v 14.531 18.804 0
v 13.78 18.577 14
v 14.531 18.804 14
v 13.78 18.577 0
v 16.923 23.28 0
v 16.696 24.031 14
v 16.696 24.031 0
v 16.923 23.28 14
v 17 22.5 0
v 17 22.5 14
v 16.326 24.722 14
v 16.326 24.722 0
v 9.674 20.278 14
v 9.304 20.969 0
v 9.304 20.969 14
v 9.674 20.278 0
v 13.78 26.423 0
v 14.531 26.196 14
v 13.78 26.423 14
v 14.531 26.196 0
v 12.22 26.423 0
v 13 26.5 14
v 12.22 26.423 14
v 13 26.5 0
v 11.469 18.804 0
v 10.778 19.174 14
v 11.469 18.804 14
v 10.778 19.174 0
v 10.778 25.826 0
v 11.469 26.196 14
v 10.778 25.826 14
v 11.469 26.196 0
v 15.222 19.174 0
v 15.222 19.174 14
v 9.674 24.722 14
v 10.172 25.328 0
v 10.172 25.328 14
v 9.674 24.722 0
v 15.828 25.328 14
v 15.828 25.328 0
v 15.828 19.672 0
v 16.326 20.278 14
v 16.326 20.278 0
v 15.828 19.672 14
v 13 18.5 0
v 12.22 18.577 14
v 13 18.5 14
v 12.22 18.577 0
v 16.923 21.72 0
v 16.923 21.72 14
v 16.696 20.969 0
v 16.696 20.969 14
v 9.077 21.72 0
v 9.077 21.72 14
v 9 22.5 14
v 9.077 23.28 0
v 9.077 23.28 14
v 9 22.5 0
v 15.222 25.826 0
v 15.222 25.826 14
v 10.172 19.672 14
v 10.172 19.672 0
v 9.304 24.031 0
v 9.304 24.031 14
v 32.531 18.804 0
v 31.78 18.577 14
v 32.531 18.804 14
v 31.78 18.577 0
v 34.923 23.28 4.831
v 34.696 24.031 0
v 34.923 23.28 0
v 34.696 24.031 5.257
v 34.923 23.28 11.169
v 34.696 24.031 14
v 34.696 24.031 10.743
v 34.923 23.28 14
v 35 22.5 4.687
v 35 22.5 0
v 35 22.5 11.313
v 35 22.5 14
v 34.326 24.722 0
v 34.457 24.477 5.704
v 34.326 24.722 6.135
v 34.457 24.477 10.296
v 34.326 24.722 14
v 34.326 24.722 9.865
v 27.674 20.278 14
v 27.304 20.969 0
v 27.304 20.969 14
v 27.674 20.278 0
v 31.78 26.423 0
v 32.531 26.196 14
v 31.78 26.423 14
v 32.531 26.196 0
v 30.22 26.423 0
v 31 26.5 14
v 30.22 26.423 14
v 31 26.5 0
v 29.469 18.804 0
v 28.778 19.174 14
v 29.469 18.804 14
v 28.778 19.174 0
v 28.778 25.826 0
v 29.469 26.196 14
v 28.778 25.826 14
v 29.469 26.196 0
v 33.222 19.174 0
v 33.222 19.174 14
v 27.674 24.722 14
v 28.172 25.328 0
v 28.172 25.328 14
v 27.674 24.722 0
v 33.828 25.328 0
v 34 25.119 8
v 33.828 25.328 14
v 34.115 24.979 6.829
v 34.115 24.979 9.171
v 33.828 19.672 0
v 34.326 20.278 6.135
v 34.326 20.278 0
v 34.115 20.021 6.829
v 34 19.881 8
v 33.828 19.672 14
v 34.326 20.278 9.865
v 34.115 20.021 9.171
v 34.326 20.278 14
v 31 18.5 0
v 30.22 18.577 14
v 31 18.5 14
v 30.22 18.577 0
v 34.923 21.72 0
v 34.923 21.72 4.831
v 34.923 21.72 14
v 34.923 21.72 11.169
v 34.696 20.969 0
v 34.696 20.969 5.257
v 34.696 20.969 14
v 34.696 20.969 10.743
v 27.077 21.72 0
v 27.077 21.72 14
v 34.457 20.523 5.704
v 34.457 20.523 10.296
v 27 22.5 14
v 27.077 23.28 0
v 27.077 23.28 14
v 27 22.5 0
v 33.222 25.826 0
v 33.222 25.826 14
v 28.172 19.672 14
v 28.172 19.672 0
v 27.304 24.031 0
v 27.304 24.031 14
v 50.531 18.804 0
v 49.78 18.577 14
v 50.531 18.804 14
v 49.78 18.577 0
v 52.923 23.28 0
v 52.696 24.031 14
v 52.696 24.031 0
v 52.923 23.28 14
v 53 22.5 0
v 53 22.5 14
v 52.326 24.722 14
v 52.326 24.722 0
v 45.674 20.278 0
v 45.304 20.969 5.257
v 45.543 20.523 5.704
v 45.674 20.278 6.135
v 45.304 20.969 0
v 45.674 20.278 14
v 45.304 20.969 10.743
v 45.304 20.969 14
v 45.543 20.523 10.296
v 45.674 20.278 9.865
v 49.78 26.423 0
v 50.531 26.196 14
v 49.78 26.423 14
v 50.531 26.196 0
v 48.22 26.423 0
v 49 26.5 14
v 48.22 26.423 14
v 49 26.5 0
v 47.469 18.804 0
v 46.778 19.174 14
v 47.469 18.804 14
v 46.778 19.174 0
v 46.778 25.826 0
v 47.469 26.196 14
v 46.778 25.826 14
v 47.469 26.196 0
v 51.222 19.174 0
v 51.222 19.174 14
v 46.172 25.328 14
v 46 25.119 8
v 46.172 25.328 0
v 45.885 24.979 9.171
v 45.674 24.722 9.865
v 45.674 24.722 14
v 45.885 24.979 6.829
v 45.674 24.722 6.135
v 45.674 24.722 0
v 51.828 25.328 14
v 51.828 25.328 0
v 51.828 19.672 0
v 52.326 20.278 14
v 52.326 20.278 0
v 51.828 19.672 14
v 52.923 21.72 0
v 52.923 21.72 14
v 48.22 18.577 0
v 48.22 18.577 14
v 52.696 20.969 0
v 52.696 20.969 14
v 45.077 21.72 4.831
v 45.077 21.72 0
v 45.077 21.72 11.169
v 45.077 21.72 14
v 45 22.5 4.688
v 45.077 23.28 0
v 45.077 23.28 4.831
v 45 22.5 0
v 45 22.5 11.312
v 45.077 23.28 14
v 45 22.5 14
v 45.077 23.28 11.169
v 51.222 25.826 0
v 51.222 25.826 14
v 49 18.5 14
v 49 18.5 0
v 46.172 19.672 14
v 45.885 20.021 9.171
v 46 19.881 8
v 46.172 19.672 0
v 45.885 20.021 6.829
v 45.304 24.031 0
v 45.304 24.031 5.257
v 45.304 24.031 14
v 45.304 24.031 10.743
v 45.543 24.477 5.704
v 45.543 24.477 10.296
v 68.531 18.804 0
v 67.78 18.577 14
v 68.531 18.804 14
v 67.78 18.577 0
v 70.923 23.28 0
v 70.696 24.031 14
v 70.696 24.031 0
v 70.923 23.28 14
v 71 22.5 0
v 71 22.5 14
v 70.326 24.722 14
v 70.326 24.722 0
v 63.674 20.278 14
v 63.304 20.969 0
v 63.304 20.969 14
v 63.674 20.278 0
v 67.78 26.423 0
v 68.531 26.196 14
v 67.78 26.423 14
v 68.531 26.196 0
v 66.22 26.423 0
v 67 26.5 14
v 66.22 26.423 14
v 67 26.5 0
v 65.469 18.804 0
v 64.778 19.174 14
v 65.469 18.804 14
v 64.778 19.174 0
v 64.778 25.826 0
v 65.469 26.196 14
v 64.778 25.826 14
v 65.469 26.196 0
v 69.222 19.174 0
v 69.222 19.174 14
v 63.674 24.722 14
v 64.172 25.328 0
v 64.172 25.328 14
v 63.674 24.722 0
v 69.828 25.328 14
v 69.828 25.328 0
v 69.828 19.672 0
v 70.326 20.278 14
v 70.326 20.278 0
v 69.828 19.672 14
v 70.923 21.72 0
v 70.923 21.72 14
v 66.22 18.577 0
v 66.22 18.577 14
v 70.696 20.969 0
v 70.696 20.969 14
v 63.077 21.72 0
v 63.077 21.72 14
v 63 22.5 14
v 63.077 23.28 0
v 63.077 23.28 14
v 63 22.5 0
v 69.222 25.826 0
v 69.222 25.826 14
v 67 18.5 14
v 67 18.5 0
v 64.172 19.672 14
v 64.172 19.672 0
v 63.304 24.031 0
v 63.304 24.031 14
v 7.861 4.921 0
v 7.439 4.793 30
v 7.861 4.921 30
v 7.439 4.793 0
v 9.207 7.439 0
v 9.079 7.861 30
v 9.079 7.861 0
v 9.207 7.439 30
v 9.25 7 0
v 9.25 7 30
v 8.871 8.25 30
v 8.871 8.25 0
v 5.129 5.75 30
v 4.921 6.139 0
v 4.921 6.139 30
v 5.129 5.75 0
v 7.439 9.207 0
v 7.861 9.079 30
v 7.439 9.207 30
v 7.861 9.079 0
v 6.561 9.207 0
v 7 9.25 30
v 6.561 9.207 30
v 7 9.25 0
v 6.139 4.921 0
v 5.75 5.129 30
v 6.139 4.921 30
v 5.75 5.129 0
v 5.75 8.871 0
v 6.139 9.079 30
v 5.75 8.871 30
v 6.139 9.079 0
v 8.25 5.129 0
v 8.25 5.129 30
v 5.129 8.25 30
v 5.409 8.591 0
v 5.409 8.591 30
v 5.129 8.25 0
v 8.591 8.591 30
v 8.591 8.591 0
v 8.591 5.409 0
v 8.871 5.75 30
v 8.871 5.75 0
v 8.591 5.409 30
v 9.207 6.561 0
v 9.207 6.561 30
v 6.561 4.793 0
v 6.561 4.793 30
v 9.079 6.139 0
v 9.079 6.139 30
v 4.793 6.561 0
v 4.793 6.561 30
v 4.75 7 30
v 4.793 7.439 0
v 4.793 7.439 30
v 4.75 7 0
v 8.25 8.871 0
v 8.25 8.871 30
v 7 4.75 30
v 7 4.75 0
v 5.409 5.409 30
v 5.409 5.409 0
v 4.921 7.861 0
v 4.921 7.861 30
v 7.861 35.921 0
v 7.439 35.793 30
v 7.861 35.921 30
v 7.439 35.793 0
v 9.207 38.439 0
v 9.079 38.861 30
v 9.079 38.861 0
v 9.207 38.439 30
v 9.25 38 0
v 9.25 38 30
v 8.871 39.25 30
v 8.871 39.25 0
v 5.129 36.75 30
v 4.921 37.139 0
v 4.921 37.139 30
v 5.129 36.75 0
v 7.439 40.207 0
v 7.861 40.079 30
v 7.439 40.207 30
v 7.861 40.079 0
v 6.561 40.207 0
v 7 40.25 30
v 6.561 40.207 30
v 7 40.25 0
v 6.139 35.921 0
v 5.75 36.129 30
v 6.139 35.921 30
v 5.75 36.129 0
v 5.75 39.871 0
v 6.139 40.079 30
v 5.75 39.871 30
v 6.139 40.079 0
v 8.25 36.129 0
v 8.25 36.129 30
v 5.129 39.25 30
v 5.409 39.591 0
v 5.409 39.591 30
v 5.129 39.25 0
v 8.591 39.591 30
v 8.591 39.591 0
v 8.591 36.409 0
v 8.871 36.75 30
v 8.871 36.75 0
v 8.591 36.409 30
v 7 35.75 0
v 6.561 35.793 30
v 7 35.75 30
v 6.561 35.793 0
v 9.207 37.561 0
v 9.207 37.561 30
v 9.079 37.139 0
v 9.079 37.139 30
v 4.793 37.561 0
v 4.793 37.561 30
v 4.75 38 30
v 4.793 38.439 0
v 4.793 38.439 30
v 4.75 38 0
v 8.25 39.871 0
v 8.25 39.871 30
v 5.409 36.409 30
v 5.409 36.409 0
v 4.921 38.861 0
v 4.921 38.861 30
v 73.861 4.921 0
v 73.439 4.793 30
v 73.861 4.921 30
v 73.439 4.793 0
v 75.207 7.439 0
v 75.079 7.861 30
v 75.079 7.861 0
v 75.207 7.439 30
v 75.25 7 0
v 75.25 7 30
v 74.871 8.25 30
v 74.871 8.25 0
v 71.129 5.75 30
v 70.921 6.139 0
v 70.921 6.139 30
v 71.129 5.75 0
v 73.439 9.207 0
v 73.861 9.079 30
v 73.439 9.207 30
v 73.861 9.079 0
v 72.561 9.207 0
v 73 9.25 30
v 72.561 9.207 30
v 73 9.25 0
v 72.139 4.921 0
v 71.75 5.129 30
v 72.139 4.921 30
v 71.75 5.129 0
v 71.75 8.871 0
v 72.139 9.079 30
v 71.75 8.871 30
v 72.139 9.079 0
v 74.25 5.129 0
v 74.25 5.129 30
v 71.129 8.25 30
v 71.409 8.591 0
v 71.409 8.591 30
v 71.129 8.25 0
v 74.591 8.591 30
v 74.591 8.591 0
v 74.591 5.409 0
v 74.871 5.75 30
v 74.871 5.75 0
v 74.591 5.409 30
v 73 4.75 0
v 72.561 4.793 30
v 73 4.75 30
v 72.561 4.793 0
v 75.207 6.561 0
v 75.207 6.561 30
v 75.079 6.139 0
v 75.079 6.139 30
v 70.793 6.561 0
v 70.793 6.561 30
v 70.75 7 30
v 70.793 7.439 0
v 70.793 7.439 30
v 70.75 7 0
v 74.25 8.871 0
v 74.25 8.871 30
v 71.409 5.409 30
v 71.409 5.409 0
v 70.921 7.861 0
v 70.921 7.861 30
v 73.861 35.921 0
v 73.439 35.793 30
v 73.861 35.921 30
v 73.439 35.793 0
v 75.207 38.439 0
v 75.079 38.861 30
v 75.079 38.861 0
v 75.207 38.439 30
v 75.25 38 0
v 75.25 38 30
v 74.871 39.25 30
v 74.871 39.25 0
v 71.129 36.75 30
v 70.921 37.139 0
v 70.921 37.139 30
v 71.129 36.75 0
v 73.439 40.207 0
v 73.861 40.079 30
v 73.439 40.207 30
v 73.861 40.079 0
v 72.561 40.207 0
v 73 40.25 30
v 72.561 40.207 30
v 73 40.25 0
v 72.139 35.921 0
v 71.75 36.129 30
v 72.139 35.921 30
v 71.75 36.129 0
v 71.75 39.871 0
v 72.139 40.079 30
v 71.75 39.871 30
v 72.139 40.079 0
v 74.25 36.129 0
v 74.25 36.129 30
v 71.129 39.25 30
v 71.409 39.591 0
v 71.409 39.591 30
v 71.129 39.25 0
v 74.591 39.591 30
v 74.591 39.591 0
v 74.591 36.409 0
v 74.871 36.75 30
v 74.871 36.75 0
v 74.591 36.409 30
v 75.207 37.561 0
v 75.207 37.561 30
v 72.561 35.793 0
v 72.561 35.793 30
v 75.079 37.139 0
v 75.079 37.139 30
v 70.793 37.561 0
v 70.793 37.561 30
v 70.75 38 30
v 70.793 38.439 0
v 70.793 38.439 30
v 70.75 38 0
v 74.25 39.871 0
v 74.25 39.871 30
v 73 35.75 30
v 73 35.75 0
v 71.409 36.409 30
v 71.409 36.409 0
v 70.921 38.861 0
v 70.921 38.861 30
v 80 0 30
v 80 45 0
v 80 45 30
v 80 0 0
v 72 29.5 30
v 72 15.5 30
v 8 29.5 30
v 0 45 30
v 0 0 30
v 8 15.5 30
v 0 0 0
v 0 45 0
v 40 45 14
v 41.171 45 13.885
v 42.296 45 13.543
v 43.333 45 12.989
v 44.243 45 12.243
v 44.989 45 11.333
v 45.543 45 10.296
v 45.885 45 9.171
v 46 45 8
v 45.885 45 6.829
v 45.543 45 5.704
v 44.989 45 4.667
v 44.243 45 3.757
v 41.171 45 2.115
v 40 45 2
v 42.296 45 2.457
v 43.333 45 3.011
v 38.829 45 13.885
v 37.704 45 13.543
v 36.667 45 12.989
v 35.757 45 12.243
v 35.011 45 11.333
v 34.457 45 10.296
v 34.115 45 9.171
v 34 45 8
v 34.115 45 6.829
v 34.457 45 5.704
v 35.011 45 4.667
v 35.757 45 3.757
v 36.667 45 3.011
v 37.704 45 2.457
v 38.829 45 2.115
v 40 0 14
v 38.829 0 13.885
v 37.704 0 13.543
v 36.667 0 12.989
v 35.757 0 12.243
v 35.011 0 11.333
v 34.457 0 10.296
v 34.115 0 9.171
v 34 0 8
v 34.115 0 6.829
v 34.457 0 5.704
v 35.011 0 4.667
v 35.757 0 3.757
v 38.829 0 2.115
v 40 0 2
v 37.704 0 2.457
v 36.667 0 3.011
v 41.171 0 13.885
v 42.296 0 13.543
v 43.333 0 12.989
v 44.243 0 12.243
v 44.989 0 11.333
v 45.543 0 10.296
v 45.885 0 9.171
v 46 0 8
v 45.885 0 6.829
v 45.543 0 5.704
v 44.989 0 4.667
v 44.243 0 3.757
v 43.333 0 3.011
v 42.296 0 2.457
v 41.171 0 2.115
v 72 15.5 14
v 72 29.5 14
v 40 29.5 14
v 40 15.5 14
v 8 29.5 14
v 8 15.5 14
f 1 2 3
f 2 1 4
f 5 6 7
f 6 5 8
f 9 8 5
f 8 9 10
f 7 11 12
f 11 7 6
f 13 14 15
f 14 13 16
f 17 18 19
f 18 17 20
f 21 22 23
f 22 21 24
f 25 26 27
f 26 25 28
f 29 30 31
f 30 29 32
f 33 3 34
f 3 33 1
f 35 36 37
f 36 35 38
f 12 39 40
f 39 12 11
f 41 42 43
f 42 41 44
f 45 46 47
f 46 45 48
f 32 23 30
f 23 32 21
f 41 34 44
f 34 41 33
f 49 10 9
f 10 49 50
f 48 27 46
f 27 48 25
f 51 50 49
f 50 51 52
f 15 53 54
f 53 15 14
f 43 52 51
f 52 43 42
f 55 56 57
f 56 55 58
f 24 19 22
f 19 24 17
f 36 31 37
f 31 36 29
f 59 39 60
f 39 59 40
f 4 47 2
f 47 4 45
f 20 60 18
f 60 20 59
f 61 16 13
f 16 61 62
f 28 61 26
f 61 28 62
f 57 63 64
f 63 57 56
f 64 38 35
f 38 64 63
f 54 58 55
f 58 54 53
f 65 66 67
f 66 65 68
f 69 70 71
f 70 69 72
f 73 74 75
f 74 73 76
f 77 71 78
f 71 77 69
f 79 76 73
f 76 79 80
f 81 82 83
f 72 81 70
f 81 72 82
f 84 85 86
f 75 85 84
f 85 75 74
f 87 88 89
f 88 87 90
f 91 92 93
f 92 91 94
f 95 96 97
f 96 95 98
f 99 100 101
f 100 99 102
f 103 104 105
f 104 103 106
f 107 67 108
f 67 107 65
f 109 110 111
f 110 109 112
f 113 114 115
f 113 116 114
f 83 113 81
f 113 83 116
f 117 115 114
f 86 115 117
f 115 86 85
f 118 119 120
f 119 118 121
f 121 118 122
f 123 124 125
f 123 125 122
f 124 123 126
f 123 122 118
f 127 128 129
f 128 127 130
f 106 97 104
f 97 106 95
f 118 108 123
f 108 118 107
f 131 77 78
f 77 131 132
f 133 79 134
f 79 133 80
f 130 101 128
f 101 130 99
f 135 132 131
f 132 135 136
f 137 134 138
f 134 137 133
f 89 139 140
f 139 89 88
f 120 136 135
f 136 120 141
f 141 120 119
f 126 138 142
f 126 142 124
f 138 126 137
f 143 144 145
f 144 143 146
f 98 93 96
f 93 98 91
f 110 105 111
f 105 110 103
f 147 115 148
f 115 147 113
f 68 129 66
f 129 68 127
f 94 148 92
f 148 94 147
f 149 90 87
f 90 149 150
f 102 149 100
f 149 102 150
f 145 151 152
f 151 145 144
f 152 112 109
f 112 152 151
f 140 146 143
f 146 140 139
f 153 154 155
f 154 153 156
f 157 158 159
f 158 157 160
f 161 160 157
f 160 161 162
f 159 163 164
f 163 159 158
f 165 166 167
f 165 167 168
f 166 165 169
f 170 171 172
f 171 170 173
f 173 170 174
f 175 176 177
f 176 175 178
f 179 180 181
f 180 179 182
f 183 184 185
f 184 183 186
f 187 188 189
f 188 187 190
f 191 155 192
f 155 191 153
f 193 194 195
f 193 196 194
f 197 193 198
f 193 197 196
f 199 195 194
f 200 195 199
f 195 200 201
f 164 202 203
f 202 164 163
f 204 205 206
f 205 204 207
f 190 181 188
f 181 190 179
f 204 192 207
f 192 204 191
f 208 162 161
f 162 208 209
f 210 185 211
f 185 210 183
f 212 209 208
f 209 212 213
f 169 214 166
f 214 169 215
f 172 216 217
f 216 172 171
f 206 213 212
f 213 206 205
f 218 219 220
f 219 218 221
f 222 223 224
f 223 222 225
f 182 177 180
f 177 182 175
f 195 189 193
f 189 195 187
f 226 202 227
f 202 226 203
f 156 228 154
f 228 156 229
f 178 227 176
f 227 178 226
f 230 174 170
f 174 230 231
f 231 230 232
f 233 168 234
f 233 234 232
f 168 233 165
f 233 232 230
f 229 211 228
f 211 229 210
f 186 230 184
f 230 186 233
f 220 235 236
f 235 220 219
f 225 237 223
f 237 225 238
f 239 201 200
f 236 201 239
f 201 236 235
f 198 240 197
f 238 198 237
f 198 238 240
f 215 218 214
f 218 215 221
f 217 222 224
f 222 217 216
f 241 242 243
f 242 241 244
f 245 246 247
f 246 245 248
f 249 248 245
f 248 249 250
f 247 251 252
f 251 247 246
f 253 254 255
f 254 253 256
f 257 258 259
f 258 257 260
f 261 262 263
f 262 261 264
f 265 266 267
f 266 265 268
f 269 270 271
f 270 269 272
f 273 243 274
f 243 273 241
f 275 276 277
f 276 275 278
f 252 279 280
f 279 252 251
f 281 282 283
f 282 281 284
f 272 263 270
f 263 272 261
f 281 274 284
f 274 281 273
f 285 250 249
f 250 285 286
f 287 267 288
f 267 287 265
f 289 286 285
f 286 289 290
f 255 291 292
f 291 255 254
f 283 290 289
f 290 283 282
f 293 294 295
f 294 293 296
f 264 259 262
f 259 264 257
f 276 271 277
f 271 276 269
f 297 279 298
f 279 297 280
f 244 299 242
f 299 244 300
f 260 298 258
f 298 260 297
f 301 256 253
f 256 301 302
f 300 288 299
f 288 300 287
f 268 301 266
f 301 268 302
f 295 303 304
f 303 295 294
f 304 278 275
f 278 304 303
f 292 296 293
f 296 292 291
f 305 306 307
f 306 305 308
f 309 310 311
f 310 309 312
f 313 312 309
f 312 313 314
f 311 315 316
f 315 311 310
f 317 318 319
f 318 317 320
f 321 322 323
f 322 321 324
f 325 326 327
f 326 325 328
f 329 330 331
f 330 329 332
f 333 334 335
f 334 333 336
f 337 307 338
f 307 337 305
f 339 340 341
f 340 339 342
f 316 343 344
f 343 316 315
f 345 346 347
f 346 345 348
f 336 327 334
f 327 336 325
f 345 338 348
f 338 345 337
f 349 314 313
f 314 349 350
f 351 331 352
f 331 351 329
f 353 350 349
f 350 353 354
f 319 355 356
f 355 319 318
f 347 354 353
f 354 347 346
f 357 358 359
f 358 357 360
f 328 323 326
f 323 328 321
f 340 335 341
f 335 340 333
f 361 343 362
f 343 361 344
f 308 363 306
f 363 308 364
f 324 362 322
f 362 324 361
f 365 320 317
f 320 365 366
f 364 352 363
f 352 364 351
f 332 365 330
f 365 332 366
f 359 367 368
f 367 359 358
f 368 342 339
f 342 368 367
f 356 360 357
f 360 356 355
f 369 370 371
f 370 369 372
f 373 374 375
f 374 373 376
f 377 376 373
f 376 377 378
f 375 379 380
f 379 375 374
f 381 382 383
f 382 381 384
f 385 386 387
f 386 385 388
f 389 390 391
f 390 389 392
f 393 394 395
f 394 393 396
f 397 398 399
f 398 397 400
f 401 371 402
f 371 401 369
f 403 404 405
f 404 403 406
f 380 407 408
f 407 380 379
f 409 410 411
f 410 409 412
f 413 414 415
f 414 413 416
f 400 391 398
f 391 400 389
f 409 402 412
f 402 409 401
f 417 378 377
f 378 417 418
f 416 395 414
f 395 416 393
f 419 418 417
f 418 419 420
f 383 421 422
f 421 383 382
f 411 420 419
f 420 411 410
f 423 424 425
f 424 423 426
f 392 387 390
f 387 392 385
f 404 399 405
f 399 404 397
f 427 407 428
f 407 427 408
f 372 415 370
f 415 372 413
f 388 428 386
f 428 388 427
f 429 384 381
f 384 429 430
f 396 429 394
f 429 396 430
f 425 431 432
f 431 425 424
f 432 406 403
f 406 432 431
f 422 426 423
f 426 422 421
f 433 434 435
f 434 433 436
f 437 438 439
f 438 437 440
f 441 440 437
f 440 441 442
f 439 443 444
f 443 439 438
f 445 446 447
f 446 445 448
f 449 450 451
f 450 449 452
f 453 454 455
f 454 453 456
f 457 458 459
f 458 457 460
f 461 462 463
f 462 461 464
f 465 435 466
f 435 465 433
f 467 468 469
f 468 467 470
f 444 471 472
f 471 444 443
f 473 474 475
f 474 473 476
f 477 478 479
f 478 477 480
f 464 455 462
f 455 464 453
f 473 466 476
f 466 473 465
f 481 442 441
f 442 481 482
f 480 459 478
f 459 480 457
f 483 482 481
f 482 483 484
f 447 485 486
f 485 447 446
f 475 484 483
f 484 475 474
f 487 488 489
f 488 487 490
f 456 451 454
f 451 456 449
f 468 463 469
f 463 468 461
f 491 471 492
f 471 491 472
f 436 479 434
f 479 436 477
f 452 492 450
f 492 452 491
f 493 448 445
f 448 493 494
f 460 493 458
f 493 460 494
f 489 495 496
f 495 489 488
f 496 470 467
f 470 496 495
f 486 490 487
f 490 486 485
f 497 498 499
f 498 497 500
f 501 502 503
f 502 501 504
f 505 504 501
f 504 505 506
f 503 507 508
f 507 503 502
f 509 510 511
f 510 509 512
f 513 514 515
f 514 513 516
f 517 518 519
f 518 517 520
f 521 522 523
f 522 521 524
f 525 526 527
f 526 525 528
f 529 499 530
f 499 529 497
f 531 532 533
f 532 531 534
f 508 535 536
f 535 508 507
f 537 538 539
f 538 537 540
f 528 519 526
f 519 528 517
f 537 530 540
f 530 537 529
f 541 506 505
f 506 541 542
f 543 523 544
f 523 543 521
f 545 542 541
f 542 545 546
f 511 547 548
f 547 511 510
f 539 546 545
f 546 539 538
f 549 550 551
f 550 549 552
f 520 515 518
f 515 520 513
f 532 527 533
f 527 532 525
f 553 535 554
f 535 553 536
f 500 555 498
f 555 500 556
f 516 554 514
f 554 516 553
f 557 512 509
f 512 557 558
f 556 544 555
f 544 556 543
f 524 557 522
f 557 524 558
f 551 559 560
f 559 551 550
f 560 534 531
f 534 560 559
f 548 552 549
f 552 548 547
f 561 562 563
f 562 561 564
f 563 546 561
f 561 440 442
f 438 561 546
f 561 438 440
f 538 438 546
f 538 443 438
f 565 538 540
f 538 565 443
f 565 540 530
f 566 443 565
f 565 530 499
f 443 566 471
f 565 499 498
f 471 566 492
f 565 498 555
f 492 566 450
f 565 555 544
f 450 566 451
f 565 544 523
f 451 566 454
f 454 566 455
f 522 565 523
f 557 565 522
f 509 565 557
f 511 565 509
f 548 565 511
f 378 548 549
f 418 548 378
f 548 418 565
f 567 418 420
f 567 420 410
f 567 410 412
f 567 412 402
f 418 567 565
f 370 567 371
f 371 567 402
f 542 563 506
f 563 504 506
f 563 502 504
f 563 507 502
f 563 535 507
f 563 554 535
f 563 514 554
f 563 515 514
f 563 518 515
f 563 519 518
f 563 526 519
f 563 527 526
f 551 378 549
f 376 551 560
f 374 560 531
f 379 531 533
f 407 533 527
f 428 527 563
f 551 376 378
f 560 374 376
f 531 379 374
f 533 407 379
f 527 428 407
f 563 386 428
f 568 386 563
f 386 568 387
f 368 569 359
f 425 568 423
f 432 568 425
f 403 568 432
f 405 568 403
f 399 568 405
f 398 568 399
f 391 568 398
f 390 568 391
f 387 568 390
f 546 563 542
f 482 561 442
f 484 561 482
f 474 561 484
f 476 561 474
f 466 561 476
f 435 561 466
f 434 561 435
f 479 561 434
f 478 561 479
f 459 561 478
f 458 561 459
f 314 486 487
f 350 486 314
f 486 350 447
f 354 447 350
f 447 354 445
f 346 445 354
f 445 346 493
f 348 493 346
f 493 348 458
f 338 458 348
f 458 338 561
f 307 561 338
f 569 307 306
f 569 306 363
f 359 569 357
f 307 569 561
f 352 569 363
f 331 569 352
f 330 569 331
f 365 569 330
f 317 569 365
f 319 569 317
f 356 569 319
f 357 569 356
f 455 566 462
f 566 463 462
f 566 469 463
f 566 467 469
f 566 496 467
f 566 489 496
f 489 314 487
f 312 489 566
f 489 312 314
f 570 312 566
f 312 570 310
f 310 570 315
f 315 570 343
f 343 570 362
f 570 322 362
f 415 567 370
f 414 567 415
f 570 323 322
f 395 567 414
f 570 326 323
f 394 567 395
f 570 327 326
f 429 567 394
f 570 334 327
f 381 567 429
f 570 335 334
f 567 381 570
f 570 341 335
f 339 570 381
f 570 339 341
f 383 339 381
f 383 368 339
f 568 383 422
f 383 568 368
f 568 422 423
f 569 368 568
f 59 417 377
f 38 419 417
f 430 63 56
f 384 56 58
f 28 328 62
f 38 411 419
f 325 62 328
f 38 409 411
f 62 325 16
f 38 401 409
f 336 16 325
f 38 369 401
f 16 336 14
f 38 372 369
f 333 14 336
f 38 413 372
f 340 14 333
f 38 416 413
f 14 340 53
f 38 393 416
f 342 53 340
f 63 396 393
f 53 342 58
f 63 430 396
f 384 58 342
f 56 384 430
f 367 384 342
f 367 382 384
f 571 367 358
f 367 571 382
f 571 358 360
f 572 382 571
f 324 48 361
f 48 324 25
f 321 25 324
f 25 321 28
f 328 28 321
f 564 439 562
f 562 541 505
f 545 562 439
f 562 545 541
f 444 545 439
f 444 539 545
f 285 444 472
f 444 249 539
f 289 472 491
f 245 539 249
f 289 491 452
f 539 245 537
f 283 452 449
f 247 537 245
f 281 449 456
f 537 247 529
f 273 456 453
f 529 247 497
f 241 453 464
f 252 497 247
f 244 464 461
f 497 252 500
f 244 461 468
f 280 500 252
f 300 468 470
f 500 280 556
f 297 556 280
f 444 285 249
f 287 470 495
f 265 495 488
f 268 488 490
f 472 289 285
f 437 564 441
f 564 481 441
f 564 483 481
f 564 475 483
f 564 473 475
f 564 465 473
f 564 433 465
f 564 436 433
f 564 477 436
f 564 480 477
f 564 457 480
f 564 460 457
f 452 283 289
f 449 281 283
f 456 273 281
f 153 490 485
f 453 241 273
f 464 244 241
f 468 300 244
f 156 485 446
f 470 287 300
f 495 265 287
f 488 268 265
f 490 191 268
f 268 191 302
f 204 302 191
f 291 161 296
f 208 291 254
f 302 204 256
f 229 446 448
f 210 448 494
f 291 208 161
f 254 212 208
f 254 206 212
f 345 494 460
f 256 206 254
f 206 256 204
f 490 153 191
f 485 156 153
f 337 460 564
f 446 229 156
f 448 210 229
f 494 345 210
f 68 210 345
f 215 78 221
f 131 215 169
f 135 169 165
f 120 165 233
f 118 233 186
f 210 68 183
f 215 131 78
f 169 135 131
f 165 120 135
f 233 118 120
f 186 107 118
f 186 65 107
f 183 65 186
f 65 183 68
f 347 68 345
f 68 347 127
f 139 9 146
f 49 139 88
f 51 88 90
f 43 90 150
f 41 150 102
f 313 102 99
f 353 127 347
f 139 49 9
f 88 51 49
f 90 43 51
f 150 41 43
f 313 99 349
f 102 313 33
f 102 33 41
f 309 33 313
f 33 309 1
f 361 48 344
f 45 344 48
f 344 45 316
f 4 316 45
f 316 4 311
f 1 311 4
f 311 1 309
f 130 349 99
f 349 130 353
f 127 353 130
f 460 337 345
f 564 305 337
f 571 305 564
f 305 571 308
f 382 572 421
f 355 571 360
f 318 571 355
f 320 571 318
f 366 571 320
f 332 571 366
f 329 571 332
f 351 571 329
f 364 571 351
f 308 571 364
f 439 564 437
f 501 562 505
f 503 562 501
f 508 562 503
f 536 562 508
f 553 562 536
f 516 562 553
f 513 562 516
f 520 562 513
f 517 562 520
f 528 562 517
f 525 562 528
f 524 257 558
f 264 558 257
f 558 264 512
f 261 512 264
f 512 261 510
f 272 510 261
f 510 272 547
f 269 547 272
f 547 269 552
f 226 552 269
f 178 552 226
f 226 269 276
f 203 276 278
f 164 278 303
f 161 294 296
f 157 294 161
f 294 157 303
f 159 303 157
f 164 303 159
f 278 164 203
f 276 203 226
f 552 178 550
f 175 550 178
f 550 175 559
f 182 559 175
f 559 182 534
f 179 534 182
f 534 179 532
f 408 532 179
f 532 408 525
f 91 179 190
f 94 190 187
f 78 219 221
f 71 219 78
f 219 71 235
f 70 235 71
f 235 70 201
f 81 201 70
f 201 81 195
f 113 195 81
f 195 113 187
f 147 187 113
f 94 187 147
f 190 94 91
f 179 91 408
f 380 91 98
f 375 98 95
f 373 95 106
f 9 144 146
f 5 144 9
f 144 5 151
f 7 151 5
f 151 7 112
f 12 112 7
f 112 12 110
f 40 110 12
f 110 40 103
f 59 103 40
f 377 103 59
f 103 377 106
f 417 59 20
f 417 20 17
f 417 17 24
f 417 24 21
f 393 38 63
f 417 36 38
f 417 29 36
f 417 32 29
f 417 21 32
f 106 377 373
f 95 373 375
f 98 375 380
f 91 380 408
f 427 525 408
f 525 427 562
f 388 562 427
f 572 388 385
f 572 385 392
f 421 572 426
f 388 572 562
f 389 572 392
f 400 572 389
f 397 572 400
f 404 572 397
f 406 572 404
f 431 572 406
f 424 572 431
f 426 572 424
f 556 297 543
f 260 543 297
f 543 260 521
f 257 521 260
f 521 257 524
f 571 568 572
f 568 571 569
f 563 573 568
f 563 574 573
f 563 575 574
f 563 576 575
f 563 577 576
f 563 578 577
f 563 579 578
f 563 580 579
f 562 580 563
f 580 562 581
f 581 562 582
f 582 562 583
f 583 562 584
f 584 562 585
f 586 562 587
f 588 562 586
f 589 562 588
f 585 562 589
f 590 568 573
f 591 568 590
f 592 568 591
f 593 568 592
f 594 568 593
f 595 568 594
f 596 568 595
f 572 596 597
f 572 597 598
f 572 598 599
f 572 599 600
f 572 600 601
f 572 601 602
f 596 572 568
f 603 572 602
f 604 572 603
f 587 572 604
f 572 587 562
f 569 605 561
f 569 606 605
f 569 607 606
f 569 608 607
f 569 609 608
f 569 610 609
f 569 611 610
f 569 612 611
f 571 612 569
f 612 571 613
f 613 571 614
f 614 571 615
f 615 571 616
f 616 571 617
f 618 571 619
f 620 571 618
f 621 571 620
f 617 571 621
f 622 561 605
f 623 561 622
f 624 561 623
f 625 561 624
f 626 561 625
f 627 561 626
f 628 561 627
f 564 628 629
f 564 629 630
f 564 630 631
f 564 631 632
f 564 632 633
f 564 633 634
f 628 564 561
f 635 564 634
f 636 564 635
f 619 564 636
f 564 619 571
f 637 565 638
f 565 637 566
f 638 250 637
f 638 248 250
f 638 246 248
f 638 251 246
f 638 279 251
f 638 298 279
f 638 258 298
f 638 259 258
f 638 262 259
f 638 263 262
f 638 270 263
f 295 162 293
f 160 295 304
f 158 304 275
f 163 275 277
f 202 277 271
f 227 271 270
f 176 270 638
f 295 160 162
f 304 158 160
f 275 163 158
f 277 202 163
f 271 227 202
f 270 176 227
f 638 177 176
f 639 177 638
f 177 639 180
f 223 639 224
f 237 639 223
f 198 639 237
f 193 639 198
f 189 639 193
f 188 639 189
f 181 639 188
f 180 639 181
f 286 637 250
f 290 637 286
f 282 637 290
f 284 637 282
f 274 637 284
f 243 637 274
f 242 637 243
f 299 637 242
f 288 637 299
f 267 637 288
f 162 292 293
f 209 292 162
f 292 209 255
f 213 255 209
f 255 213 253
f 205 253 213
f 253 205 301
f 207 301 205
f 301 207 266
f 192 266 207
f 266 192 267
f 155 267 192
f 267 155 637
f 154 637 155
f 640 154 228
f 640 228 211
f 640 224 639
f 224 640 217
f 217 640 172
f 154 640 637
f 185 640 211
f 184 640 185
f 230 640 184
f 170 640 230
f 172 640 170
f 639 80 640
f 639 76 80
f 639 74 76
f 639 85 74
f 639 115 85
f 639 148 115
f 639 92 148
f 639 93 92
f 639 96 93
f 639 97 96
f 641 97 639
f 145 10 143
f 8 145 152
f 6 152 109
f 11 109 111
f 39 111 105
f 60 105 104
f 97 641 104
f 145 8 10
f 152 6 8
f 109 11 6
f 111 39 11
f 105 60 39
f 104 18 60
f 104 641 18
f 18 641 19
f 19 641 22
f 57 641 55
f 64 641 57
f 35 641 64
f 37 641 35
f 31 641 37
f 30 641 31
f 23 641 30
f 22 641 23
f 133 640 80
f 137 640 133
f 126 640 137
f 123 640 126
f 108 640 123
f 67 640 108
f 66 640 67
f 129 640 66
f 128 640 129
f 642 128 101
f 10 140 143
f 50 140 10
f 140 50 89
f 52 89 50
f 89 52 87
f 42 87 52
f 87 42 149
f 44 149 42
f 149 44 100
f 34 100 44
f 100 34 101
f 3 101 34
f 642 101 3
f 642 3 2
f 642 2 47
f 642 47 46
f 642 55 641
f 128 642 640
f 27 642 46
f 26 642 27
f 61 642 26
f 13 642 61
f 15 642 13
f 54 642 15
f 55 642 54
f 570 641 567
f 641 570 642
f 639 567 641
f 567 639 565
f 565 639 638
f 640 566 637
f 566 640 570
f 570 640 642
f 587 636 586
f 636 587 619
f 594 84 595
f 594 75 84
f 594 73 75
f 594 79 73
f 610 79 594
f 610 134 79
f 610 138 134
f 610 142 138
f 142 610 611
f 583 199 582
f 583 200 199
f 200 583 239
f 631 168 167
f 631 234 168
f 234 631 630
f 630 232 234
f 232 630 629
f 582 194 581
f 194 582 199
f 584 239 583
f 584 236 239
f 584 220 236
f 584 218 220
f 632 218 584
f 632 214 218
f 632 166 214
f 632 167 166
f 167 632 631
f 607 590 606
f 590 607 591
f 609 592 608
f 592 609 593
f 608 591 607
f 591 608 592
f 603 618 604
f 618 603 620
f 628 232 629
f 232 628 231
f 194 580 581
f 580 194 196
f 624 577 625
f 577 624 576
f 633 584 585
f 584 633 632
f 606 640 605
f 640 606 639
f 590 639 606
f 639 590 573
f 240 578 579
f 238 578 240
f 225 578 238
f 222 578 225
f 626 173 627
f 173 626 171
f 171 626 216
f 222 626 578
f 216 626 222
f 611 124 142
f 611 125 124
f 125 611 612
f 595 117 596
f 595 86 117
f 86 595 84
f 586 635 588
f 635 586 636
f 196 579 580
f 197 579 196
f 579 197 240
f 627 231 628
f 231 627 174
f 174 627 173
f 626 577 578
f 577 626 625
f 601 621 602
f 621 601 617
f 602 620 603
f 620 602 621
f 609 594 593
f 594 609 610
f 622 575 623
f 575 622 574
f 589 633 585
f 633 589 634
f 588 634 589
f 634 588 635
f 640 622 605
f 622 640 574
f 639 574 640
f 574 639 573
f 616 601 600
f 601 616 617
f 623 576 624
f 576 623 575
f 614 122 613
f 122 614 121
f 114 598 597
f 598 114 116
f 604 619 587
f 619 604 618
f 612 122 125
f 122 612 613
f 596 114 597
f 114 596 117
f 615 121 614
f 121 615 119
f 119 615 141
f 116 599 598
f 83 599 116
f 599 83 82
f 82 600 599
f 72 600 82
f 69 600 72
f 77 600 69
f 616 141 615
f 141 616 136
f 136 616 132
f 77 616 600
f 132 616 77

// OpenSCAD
$fn = 32;

// ----------------------------------------------------------------------
// Manifold block: side_outlet manifold
// ----------------------------------------------------------------------

// --- parameters (mm) ---
block_l = 80;             // block length, X
block_w = 45;             // block width, Y
block_h = 30;             // block height, Z
port_d = 8;               // port bore diameter
port_pitch = 18;          // port pitch along X
gallery_d = 14;           // top gallery width, Y
gallery_depth = 16;       // gallery pocket depth
wall_p = 8;               // gallery end wall thickness, X
mnt_d = 4.5;              // mounting hole diameter
mnt_in = 7;               // mounting hole inset from the edges
out_d = 12;               // outlet bore diameter
out_z = 8;                // outlet axis height

n_ports = 4;  // ports in the row
port_x0 = (block_l - (n_ports - 1) * port_pitch) / 2;  // first port X

difference() {
  cube([block_l, block_w, block_h]);
  for (i = [0 : n_ports - 1])
    translate([port_x0 + i * port_pitch, block_w / 2, -1])
      cylinder(h = block_h + 2, d = port_d);
  translate([wall_p, block_w / 2 - gallery_d / 2, block_h - gallery_depth])
    cube([block_l - 2 * wall_p, gallery_d, gallery_depth + 1]);
  for (cx = [mnt_in, block_l - mnt_in])
    for (cy = [mnt_in, block_w - mnt_in])
      translate([cx, cy, -1]) cylinder(h = block_h + 2, d = mnt_d);
  translate([block_l / 2, -1, out_z]) rotate([-90, 0, 0])
    cylinder(h = block_w + 2, d = out_d);
}
